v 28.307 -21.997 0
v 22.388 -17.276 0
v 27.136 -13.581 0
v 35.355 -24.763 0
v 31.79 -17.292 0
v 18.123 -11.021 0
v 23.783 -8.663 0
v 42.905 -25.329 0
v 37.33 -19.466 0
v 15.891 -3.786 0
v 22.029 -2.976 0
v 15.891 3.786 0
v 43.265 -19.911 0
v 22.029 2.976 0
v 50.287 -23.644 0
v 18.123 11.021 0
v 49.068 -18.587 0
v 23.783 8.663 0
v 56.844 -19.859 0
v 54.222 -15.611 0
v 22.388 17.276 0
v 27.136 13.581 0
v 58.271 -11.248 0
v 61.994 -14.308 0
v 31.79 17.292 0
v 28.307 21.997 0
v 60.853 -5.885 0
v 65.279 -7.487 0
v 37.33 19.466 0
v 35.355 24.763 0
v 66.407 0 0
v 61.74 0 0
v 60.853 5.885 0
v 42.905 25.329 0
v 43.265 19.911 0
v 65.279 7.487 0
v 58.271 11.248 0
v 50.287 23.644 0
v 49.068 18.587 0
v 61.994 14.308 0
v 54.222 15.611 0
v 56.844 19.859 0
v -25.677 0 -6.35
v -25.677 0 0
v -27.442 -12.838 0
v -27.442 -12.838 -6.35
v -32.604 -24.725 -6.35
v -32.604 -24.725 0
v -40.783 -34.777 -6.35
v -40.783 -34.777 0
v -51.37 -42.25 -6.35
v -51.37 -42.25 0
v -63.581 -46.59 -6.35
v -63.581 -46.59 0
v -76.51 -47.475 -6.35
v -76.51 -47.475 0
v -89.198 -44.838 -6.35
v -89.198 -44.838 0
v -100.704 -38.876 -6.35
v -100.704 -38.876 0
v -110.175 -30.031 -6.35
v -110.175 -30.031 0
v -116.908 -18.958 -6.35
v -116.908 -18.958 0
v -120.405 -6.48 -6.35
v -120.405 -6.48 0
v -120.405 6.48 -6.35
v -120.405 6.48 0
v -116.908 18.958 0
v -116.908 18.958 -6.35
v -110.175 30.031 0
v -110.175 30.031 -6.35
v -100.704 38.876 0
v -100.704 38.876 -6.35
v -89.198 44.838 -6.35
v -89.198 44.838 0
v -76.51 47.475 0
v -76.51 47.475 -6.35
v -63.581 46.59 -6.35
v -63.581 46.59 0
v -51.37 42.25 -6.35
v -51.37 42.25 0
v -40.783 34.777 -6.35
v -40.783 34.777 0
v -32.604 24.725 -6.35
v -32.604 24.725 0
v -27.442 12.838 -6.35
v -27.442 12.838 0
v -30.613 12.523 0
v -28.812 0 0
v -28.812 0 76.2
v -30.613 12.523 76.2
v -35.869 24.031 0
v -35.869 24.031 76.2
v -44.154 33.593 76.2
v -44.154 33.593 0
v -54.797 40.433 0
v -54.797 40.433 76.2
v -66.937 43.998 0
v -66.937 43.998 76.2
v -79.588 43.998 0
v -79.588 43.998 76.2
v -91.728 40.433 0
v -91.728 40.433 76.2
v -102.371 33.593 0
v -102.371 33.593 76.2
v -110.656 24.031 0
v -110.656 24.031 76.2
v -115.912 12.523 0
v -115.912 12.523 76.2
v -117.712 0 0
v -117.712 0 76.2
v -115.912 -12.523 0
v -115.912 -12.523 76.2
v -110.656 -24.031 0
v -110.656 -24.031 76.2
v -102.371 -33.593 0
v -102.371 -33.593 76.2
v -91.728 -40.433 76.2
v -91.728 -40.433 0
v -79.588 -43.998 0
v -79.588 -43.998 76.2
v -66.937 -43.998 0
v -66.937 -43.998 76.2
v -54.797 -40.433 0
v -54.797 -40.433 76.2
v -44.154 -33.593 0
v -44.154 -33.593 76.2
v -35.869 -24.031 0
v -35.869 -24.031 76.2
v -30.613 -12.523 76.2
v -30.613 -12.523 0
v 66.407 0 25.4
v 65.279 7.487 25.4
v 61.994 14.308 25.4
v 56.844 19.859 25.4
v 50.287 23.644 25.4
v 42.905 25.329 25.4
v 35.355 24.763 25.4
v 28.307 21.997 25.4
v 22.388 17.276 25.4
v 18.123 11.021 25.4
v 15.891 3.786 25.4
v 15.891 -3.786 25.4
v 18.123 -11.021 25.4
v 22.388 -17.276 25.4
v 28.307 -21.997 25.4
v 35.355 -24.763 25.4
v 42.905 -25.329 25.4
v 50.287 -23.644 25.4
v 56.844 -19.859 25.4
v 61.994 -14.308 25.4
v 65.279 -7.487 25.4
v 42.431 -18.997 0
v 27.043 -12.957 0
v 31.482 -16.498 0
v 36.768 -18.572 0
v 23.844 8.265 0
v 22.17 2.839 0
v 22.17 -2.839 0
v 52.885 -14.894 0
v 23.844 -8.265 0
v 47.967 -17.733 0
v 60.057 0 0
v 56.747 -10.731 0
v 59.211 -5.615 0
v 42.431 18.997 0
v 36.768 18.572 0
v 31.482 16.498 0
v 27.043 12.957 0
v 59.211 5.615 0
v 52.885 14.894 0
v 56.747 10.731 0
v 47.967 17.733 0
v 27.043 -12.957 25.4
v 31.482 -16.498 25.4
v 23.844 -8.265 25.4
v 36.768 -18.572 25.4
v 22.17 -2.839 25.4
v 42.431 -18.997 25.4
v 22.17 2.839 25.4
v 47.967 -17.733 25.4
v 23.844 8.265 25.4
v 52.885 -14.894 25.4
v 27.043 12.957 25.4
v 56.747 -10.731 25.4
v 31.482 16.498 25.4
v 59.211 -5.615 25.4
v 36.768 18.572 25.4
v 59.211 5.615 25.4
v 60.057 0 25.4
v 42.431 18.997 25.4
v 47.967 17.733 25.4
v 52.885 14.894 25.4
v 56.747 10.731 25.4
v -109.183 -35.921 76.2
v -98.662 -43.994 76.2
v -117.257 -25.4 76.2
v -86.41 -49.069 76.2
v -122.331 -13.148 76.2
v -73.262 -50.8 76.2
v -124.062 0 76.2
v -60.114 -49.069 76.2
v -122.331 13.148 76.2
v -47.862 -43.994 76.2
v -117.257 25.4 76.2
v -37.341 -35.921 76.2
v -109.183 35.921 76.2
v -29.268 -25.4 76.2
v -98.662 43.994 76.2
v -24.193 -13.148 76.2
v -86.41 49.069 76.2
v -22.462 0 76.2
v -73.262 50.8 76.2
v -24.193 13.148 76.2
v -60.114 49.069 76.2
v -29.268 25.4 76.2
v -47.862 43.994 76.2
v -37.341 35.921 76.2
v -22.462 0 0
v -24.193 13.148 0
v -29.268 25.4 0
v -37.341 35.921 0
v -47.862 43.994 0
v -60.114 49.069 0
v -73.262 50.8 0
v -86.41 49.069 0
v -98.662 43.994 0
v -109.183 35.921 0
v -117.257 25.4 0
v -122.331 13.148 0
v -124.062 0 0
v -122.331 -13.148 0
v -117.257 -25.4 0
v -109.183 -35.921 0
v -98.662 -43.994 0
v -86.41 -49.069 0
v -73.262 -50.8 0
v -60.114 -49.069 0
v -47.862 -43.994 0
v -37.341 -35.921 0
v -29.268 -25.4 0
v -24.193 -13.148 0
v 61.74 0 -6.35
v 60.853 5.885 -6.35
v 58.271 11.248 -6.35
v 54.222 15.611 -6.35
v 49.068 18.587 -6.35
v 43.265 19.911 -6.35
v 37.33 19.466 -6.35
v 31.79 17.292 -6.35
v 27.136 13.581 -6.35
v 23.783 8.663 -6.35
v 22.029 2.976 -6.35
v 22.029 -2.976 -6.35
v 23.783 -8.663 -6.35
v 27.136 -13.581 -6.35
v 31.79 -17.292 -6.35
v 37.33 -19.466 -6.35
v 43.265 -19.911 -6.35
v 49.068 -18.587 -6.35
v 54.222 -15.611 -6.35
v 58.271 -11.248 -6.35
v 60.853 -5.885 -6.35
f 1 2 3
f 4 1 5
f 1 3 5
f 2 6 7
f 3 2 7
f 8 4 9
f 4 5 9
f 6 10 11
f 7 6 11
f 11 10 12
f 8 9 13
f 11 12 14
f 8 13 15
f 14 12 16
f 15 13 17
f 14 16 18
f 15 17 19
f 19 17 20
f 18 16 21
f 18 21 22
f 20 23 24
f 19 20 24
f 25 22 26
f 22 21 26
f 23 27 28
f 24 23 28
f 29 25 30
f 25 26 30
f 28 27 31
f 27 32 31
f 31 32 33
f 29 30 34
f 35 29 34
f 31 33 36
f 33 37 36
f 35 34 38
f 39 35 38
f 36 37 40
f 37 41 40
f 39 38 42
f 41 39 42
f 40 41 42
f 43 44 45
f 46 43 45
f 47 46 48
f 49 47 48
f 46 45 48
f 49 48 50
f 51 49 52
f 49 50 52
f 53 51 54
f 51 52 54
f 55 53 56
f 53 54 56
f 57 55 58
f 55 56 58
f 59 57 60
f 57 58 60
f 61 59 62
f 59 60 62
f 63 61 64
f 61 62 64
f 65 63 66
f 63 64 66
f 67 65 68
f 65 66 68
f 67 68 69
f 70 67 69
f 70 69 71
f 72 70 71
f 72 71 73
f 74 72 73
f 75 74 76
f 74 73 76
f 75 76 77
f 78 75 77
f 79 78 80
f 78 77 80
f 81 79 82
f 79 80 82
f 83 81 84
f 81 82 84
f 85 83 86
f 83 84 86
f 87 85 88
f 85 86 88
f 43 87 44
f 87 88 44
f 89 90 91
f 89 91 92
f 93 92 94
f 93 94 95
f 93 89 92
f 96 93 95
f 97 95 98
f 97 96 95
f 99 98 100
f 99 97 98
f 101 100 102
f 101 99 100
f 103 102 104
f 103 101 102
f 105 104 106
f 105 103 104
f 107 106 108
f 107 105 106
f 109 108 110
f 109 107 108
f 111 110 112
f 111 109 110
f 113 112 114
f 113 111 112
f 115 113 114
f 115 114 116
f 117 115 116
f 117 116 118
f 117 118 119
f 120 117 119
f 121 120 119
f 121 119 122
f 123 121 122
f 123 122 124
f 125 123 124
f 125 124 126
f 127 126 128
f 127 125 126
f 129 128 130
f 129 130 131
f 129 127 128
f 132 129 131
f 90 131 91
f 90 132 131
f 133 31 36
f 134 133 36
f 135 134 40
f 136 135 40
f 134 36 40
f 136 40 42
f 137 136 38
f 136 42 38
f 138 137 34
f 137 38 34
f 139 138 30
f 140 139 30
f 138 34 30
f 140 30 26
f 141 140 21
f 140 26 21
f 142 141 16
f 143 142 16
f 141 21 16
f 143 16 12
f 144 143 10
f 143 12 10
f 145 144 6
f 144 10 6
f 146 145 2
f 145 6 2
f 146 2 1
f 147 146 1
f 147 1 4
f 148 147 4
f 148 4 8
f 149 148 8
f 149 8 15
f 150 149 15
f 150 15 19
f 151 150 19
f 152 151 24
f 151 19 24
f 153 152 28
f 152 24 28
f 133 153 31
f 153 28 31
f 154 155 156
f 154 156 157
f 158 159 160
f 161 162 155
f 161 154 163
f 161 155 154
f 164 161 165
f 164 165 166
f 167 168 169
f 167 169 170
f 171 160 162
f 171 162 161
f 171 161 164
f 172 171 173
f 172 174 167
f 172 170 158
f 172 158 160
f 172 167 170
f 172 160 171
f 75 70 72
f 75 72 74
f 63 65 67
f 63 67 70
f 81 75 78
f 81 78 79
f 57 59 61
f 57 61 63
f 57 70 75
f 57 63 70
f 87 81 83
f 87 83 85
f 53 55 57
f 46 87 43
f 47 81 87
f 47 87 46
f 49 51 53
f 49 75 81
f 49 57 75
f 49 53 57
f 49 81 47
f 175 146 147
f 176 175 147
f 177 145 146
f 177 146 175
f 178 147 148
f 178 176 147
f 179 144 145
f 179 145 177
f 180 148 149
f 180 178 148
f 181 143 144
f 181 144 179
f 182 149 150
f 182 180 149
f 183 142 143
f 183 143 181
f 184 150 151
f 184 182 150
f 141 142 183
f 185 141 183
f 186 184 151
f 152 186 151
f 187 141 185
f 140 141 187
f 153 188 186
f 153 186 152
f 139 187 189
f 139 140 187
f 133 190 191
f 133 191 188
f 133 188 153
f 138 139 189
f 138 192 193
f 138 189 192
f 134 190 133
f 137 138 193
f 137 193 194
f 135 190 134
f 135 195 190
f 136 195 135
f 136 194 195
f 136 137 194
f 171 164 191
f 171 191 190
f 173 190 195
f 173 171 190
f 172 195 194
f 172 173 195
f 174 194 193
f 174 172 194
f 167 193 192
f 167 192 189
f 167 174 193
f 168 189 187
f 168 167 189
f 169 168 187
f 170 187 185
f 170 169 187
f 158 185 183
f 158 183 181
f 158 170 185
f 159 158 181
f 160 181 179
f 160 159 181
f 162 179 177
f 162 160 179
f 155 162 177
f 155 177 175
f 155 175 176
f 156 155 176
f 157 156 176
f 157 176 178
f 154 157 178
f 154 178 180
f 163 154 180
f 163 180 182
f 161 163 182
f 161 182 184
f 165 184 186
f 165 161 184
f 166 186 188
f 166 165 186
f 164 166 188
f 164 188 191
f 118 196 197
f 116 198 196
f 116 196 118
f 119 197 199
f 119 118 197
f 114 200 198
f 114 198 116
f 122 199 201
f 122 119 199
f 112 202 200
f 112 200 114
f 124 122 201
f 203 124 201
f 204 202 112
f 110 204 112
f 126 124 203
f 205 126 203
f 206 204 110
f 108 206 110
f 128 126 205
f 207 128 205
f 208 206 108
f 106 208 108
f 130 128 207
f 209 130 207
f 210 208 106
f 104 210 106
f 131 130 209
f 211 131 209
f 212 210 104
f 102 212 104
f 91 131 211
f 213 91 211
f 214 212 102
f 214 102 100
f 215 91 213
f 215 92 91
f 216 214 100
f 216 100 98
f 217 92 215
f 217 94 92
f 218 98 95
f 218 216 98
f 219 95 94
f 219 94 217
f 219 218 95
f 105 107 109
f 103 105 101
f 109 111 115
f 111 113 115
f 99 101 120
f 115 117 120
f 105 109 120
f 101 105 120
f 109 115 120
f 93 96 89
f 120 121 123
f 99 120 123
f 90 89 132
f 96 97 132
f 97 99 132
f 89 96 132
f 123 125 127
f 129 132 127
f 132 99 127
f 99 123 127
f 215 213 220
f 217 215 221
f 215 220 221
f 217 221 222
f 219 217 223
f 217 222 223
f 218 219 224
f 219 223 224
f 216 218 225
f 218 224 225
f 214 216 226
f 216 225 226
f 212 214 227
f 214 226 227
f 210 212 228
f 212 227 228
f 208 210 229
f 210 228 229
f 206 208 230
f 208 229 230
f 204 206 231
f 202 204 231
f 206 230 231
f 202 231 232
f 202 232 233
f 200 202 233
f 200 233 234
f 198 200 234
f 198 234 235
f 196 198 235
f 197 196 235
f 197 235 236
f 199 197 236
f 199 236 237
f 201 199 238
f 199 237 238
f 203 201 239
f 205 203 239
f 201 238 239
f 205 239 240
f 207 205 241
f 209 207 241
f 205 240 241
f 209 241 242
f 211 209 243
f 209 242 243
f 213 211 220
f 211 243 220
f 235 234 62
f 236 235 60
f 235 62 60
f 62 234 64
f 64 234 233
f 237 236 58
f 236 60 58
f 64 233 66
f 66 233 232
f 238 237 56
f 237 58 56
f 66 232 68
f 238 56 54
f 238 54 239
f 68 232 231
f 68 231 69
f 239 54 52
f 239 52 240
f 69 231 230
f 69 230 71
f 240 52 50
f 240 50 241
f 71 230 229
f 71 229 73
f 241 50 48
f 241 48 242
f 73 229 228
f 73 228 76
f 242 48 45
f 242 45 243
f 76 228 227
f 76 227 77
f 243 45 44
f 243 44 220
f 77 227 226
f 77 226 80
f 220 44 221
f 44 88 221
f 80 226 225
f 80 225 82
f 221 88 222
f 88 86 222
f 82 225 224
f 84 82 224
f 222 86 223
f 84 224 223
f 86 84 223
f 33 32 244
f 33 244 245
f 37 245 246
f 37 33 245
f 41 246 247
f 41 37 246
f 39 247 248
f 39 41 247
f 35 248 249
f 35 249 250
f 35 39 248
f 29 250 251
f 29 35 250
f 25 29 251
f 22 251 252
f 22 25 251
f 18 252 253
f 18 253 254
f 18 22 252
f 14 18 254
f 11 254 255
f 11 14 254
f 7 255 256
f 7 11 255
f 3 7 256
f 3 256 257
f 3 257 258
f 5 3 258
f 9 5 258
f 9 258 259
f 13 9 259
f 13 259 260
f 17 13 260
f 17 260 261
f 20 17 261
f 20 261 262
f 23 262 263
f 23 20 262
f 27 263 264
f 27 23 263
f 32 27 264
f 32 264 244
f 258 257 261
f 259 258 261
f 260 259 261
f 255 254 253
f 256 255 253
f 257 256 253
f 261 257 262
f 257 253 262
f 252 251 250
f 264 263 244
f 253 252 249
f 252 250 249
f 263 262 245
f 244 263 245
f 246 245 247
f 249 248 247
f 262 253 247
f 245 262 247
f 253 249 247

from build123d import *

# Parameters (mm, degrees)
F0_R     = 50.8
F0_R_2   = 44.45
F1_DEPTH = 76.2
F2_R     = 47.585508
F3_DEPTH = 6.35
F4_R     = 25.4
F4_R_2   = 19.05
F5_DEPTH = 25.4
F6_R     = 19.967077
F7_DEPTH = 6.35


with BuildPart() as f1:
    # F0 (on Top) → F1 (new body)
    with BuildSketch(Plane.XY):
        with Locations((-73.26245, 0)):
            Circle(F0_R)
        with Locations((-73.26245, 0)):
            Circle(F0_R_2, mode=Mode.SUBTRACT)
    extrude(amount=F1_DEPTH)

    # F2 (on face) → F3 (join)
    with BuildSketch(Plane(origin=(0, 0, 0), x_dir=(1, 0, 0), z_dir=(0, 0, -1))):
        with Locations((-73.26245, 0)):
            Circle(F2_R)
    extrude(amount=F3_DEPTH)


with BuildPart() as f5:
    # F4 (on Top) → F5 (new body)
    with BuildSketch(Plane.XY):
        with Locations((41.007183, 0)):
            Circle(F4_R)
        with Locations((41.007183, 0)):
            Circle(F4_R_2, mode=Mode.SUBTRACT)
    extrude(amount=F5_DEPTH)

    # F6 (on Top) → F7 (join)
    with BuildSketch(Plane.XY):
        with Locations((41.773129, 0)):
            Circle(F6_R)
    extrude(amount=-F7_DEPTH)


solid = Compound([f1.part, f5.part])
